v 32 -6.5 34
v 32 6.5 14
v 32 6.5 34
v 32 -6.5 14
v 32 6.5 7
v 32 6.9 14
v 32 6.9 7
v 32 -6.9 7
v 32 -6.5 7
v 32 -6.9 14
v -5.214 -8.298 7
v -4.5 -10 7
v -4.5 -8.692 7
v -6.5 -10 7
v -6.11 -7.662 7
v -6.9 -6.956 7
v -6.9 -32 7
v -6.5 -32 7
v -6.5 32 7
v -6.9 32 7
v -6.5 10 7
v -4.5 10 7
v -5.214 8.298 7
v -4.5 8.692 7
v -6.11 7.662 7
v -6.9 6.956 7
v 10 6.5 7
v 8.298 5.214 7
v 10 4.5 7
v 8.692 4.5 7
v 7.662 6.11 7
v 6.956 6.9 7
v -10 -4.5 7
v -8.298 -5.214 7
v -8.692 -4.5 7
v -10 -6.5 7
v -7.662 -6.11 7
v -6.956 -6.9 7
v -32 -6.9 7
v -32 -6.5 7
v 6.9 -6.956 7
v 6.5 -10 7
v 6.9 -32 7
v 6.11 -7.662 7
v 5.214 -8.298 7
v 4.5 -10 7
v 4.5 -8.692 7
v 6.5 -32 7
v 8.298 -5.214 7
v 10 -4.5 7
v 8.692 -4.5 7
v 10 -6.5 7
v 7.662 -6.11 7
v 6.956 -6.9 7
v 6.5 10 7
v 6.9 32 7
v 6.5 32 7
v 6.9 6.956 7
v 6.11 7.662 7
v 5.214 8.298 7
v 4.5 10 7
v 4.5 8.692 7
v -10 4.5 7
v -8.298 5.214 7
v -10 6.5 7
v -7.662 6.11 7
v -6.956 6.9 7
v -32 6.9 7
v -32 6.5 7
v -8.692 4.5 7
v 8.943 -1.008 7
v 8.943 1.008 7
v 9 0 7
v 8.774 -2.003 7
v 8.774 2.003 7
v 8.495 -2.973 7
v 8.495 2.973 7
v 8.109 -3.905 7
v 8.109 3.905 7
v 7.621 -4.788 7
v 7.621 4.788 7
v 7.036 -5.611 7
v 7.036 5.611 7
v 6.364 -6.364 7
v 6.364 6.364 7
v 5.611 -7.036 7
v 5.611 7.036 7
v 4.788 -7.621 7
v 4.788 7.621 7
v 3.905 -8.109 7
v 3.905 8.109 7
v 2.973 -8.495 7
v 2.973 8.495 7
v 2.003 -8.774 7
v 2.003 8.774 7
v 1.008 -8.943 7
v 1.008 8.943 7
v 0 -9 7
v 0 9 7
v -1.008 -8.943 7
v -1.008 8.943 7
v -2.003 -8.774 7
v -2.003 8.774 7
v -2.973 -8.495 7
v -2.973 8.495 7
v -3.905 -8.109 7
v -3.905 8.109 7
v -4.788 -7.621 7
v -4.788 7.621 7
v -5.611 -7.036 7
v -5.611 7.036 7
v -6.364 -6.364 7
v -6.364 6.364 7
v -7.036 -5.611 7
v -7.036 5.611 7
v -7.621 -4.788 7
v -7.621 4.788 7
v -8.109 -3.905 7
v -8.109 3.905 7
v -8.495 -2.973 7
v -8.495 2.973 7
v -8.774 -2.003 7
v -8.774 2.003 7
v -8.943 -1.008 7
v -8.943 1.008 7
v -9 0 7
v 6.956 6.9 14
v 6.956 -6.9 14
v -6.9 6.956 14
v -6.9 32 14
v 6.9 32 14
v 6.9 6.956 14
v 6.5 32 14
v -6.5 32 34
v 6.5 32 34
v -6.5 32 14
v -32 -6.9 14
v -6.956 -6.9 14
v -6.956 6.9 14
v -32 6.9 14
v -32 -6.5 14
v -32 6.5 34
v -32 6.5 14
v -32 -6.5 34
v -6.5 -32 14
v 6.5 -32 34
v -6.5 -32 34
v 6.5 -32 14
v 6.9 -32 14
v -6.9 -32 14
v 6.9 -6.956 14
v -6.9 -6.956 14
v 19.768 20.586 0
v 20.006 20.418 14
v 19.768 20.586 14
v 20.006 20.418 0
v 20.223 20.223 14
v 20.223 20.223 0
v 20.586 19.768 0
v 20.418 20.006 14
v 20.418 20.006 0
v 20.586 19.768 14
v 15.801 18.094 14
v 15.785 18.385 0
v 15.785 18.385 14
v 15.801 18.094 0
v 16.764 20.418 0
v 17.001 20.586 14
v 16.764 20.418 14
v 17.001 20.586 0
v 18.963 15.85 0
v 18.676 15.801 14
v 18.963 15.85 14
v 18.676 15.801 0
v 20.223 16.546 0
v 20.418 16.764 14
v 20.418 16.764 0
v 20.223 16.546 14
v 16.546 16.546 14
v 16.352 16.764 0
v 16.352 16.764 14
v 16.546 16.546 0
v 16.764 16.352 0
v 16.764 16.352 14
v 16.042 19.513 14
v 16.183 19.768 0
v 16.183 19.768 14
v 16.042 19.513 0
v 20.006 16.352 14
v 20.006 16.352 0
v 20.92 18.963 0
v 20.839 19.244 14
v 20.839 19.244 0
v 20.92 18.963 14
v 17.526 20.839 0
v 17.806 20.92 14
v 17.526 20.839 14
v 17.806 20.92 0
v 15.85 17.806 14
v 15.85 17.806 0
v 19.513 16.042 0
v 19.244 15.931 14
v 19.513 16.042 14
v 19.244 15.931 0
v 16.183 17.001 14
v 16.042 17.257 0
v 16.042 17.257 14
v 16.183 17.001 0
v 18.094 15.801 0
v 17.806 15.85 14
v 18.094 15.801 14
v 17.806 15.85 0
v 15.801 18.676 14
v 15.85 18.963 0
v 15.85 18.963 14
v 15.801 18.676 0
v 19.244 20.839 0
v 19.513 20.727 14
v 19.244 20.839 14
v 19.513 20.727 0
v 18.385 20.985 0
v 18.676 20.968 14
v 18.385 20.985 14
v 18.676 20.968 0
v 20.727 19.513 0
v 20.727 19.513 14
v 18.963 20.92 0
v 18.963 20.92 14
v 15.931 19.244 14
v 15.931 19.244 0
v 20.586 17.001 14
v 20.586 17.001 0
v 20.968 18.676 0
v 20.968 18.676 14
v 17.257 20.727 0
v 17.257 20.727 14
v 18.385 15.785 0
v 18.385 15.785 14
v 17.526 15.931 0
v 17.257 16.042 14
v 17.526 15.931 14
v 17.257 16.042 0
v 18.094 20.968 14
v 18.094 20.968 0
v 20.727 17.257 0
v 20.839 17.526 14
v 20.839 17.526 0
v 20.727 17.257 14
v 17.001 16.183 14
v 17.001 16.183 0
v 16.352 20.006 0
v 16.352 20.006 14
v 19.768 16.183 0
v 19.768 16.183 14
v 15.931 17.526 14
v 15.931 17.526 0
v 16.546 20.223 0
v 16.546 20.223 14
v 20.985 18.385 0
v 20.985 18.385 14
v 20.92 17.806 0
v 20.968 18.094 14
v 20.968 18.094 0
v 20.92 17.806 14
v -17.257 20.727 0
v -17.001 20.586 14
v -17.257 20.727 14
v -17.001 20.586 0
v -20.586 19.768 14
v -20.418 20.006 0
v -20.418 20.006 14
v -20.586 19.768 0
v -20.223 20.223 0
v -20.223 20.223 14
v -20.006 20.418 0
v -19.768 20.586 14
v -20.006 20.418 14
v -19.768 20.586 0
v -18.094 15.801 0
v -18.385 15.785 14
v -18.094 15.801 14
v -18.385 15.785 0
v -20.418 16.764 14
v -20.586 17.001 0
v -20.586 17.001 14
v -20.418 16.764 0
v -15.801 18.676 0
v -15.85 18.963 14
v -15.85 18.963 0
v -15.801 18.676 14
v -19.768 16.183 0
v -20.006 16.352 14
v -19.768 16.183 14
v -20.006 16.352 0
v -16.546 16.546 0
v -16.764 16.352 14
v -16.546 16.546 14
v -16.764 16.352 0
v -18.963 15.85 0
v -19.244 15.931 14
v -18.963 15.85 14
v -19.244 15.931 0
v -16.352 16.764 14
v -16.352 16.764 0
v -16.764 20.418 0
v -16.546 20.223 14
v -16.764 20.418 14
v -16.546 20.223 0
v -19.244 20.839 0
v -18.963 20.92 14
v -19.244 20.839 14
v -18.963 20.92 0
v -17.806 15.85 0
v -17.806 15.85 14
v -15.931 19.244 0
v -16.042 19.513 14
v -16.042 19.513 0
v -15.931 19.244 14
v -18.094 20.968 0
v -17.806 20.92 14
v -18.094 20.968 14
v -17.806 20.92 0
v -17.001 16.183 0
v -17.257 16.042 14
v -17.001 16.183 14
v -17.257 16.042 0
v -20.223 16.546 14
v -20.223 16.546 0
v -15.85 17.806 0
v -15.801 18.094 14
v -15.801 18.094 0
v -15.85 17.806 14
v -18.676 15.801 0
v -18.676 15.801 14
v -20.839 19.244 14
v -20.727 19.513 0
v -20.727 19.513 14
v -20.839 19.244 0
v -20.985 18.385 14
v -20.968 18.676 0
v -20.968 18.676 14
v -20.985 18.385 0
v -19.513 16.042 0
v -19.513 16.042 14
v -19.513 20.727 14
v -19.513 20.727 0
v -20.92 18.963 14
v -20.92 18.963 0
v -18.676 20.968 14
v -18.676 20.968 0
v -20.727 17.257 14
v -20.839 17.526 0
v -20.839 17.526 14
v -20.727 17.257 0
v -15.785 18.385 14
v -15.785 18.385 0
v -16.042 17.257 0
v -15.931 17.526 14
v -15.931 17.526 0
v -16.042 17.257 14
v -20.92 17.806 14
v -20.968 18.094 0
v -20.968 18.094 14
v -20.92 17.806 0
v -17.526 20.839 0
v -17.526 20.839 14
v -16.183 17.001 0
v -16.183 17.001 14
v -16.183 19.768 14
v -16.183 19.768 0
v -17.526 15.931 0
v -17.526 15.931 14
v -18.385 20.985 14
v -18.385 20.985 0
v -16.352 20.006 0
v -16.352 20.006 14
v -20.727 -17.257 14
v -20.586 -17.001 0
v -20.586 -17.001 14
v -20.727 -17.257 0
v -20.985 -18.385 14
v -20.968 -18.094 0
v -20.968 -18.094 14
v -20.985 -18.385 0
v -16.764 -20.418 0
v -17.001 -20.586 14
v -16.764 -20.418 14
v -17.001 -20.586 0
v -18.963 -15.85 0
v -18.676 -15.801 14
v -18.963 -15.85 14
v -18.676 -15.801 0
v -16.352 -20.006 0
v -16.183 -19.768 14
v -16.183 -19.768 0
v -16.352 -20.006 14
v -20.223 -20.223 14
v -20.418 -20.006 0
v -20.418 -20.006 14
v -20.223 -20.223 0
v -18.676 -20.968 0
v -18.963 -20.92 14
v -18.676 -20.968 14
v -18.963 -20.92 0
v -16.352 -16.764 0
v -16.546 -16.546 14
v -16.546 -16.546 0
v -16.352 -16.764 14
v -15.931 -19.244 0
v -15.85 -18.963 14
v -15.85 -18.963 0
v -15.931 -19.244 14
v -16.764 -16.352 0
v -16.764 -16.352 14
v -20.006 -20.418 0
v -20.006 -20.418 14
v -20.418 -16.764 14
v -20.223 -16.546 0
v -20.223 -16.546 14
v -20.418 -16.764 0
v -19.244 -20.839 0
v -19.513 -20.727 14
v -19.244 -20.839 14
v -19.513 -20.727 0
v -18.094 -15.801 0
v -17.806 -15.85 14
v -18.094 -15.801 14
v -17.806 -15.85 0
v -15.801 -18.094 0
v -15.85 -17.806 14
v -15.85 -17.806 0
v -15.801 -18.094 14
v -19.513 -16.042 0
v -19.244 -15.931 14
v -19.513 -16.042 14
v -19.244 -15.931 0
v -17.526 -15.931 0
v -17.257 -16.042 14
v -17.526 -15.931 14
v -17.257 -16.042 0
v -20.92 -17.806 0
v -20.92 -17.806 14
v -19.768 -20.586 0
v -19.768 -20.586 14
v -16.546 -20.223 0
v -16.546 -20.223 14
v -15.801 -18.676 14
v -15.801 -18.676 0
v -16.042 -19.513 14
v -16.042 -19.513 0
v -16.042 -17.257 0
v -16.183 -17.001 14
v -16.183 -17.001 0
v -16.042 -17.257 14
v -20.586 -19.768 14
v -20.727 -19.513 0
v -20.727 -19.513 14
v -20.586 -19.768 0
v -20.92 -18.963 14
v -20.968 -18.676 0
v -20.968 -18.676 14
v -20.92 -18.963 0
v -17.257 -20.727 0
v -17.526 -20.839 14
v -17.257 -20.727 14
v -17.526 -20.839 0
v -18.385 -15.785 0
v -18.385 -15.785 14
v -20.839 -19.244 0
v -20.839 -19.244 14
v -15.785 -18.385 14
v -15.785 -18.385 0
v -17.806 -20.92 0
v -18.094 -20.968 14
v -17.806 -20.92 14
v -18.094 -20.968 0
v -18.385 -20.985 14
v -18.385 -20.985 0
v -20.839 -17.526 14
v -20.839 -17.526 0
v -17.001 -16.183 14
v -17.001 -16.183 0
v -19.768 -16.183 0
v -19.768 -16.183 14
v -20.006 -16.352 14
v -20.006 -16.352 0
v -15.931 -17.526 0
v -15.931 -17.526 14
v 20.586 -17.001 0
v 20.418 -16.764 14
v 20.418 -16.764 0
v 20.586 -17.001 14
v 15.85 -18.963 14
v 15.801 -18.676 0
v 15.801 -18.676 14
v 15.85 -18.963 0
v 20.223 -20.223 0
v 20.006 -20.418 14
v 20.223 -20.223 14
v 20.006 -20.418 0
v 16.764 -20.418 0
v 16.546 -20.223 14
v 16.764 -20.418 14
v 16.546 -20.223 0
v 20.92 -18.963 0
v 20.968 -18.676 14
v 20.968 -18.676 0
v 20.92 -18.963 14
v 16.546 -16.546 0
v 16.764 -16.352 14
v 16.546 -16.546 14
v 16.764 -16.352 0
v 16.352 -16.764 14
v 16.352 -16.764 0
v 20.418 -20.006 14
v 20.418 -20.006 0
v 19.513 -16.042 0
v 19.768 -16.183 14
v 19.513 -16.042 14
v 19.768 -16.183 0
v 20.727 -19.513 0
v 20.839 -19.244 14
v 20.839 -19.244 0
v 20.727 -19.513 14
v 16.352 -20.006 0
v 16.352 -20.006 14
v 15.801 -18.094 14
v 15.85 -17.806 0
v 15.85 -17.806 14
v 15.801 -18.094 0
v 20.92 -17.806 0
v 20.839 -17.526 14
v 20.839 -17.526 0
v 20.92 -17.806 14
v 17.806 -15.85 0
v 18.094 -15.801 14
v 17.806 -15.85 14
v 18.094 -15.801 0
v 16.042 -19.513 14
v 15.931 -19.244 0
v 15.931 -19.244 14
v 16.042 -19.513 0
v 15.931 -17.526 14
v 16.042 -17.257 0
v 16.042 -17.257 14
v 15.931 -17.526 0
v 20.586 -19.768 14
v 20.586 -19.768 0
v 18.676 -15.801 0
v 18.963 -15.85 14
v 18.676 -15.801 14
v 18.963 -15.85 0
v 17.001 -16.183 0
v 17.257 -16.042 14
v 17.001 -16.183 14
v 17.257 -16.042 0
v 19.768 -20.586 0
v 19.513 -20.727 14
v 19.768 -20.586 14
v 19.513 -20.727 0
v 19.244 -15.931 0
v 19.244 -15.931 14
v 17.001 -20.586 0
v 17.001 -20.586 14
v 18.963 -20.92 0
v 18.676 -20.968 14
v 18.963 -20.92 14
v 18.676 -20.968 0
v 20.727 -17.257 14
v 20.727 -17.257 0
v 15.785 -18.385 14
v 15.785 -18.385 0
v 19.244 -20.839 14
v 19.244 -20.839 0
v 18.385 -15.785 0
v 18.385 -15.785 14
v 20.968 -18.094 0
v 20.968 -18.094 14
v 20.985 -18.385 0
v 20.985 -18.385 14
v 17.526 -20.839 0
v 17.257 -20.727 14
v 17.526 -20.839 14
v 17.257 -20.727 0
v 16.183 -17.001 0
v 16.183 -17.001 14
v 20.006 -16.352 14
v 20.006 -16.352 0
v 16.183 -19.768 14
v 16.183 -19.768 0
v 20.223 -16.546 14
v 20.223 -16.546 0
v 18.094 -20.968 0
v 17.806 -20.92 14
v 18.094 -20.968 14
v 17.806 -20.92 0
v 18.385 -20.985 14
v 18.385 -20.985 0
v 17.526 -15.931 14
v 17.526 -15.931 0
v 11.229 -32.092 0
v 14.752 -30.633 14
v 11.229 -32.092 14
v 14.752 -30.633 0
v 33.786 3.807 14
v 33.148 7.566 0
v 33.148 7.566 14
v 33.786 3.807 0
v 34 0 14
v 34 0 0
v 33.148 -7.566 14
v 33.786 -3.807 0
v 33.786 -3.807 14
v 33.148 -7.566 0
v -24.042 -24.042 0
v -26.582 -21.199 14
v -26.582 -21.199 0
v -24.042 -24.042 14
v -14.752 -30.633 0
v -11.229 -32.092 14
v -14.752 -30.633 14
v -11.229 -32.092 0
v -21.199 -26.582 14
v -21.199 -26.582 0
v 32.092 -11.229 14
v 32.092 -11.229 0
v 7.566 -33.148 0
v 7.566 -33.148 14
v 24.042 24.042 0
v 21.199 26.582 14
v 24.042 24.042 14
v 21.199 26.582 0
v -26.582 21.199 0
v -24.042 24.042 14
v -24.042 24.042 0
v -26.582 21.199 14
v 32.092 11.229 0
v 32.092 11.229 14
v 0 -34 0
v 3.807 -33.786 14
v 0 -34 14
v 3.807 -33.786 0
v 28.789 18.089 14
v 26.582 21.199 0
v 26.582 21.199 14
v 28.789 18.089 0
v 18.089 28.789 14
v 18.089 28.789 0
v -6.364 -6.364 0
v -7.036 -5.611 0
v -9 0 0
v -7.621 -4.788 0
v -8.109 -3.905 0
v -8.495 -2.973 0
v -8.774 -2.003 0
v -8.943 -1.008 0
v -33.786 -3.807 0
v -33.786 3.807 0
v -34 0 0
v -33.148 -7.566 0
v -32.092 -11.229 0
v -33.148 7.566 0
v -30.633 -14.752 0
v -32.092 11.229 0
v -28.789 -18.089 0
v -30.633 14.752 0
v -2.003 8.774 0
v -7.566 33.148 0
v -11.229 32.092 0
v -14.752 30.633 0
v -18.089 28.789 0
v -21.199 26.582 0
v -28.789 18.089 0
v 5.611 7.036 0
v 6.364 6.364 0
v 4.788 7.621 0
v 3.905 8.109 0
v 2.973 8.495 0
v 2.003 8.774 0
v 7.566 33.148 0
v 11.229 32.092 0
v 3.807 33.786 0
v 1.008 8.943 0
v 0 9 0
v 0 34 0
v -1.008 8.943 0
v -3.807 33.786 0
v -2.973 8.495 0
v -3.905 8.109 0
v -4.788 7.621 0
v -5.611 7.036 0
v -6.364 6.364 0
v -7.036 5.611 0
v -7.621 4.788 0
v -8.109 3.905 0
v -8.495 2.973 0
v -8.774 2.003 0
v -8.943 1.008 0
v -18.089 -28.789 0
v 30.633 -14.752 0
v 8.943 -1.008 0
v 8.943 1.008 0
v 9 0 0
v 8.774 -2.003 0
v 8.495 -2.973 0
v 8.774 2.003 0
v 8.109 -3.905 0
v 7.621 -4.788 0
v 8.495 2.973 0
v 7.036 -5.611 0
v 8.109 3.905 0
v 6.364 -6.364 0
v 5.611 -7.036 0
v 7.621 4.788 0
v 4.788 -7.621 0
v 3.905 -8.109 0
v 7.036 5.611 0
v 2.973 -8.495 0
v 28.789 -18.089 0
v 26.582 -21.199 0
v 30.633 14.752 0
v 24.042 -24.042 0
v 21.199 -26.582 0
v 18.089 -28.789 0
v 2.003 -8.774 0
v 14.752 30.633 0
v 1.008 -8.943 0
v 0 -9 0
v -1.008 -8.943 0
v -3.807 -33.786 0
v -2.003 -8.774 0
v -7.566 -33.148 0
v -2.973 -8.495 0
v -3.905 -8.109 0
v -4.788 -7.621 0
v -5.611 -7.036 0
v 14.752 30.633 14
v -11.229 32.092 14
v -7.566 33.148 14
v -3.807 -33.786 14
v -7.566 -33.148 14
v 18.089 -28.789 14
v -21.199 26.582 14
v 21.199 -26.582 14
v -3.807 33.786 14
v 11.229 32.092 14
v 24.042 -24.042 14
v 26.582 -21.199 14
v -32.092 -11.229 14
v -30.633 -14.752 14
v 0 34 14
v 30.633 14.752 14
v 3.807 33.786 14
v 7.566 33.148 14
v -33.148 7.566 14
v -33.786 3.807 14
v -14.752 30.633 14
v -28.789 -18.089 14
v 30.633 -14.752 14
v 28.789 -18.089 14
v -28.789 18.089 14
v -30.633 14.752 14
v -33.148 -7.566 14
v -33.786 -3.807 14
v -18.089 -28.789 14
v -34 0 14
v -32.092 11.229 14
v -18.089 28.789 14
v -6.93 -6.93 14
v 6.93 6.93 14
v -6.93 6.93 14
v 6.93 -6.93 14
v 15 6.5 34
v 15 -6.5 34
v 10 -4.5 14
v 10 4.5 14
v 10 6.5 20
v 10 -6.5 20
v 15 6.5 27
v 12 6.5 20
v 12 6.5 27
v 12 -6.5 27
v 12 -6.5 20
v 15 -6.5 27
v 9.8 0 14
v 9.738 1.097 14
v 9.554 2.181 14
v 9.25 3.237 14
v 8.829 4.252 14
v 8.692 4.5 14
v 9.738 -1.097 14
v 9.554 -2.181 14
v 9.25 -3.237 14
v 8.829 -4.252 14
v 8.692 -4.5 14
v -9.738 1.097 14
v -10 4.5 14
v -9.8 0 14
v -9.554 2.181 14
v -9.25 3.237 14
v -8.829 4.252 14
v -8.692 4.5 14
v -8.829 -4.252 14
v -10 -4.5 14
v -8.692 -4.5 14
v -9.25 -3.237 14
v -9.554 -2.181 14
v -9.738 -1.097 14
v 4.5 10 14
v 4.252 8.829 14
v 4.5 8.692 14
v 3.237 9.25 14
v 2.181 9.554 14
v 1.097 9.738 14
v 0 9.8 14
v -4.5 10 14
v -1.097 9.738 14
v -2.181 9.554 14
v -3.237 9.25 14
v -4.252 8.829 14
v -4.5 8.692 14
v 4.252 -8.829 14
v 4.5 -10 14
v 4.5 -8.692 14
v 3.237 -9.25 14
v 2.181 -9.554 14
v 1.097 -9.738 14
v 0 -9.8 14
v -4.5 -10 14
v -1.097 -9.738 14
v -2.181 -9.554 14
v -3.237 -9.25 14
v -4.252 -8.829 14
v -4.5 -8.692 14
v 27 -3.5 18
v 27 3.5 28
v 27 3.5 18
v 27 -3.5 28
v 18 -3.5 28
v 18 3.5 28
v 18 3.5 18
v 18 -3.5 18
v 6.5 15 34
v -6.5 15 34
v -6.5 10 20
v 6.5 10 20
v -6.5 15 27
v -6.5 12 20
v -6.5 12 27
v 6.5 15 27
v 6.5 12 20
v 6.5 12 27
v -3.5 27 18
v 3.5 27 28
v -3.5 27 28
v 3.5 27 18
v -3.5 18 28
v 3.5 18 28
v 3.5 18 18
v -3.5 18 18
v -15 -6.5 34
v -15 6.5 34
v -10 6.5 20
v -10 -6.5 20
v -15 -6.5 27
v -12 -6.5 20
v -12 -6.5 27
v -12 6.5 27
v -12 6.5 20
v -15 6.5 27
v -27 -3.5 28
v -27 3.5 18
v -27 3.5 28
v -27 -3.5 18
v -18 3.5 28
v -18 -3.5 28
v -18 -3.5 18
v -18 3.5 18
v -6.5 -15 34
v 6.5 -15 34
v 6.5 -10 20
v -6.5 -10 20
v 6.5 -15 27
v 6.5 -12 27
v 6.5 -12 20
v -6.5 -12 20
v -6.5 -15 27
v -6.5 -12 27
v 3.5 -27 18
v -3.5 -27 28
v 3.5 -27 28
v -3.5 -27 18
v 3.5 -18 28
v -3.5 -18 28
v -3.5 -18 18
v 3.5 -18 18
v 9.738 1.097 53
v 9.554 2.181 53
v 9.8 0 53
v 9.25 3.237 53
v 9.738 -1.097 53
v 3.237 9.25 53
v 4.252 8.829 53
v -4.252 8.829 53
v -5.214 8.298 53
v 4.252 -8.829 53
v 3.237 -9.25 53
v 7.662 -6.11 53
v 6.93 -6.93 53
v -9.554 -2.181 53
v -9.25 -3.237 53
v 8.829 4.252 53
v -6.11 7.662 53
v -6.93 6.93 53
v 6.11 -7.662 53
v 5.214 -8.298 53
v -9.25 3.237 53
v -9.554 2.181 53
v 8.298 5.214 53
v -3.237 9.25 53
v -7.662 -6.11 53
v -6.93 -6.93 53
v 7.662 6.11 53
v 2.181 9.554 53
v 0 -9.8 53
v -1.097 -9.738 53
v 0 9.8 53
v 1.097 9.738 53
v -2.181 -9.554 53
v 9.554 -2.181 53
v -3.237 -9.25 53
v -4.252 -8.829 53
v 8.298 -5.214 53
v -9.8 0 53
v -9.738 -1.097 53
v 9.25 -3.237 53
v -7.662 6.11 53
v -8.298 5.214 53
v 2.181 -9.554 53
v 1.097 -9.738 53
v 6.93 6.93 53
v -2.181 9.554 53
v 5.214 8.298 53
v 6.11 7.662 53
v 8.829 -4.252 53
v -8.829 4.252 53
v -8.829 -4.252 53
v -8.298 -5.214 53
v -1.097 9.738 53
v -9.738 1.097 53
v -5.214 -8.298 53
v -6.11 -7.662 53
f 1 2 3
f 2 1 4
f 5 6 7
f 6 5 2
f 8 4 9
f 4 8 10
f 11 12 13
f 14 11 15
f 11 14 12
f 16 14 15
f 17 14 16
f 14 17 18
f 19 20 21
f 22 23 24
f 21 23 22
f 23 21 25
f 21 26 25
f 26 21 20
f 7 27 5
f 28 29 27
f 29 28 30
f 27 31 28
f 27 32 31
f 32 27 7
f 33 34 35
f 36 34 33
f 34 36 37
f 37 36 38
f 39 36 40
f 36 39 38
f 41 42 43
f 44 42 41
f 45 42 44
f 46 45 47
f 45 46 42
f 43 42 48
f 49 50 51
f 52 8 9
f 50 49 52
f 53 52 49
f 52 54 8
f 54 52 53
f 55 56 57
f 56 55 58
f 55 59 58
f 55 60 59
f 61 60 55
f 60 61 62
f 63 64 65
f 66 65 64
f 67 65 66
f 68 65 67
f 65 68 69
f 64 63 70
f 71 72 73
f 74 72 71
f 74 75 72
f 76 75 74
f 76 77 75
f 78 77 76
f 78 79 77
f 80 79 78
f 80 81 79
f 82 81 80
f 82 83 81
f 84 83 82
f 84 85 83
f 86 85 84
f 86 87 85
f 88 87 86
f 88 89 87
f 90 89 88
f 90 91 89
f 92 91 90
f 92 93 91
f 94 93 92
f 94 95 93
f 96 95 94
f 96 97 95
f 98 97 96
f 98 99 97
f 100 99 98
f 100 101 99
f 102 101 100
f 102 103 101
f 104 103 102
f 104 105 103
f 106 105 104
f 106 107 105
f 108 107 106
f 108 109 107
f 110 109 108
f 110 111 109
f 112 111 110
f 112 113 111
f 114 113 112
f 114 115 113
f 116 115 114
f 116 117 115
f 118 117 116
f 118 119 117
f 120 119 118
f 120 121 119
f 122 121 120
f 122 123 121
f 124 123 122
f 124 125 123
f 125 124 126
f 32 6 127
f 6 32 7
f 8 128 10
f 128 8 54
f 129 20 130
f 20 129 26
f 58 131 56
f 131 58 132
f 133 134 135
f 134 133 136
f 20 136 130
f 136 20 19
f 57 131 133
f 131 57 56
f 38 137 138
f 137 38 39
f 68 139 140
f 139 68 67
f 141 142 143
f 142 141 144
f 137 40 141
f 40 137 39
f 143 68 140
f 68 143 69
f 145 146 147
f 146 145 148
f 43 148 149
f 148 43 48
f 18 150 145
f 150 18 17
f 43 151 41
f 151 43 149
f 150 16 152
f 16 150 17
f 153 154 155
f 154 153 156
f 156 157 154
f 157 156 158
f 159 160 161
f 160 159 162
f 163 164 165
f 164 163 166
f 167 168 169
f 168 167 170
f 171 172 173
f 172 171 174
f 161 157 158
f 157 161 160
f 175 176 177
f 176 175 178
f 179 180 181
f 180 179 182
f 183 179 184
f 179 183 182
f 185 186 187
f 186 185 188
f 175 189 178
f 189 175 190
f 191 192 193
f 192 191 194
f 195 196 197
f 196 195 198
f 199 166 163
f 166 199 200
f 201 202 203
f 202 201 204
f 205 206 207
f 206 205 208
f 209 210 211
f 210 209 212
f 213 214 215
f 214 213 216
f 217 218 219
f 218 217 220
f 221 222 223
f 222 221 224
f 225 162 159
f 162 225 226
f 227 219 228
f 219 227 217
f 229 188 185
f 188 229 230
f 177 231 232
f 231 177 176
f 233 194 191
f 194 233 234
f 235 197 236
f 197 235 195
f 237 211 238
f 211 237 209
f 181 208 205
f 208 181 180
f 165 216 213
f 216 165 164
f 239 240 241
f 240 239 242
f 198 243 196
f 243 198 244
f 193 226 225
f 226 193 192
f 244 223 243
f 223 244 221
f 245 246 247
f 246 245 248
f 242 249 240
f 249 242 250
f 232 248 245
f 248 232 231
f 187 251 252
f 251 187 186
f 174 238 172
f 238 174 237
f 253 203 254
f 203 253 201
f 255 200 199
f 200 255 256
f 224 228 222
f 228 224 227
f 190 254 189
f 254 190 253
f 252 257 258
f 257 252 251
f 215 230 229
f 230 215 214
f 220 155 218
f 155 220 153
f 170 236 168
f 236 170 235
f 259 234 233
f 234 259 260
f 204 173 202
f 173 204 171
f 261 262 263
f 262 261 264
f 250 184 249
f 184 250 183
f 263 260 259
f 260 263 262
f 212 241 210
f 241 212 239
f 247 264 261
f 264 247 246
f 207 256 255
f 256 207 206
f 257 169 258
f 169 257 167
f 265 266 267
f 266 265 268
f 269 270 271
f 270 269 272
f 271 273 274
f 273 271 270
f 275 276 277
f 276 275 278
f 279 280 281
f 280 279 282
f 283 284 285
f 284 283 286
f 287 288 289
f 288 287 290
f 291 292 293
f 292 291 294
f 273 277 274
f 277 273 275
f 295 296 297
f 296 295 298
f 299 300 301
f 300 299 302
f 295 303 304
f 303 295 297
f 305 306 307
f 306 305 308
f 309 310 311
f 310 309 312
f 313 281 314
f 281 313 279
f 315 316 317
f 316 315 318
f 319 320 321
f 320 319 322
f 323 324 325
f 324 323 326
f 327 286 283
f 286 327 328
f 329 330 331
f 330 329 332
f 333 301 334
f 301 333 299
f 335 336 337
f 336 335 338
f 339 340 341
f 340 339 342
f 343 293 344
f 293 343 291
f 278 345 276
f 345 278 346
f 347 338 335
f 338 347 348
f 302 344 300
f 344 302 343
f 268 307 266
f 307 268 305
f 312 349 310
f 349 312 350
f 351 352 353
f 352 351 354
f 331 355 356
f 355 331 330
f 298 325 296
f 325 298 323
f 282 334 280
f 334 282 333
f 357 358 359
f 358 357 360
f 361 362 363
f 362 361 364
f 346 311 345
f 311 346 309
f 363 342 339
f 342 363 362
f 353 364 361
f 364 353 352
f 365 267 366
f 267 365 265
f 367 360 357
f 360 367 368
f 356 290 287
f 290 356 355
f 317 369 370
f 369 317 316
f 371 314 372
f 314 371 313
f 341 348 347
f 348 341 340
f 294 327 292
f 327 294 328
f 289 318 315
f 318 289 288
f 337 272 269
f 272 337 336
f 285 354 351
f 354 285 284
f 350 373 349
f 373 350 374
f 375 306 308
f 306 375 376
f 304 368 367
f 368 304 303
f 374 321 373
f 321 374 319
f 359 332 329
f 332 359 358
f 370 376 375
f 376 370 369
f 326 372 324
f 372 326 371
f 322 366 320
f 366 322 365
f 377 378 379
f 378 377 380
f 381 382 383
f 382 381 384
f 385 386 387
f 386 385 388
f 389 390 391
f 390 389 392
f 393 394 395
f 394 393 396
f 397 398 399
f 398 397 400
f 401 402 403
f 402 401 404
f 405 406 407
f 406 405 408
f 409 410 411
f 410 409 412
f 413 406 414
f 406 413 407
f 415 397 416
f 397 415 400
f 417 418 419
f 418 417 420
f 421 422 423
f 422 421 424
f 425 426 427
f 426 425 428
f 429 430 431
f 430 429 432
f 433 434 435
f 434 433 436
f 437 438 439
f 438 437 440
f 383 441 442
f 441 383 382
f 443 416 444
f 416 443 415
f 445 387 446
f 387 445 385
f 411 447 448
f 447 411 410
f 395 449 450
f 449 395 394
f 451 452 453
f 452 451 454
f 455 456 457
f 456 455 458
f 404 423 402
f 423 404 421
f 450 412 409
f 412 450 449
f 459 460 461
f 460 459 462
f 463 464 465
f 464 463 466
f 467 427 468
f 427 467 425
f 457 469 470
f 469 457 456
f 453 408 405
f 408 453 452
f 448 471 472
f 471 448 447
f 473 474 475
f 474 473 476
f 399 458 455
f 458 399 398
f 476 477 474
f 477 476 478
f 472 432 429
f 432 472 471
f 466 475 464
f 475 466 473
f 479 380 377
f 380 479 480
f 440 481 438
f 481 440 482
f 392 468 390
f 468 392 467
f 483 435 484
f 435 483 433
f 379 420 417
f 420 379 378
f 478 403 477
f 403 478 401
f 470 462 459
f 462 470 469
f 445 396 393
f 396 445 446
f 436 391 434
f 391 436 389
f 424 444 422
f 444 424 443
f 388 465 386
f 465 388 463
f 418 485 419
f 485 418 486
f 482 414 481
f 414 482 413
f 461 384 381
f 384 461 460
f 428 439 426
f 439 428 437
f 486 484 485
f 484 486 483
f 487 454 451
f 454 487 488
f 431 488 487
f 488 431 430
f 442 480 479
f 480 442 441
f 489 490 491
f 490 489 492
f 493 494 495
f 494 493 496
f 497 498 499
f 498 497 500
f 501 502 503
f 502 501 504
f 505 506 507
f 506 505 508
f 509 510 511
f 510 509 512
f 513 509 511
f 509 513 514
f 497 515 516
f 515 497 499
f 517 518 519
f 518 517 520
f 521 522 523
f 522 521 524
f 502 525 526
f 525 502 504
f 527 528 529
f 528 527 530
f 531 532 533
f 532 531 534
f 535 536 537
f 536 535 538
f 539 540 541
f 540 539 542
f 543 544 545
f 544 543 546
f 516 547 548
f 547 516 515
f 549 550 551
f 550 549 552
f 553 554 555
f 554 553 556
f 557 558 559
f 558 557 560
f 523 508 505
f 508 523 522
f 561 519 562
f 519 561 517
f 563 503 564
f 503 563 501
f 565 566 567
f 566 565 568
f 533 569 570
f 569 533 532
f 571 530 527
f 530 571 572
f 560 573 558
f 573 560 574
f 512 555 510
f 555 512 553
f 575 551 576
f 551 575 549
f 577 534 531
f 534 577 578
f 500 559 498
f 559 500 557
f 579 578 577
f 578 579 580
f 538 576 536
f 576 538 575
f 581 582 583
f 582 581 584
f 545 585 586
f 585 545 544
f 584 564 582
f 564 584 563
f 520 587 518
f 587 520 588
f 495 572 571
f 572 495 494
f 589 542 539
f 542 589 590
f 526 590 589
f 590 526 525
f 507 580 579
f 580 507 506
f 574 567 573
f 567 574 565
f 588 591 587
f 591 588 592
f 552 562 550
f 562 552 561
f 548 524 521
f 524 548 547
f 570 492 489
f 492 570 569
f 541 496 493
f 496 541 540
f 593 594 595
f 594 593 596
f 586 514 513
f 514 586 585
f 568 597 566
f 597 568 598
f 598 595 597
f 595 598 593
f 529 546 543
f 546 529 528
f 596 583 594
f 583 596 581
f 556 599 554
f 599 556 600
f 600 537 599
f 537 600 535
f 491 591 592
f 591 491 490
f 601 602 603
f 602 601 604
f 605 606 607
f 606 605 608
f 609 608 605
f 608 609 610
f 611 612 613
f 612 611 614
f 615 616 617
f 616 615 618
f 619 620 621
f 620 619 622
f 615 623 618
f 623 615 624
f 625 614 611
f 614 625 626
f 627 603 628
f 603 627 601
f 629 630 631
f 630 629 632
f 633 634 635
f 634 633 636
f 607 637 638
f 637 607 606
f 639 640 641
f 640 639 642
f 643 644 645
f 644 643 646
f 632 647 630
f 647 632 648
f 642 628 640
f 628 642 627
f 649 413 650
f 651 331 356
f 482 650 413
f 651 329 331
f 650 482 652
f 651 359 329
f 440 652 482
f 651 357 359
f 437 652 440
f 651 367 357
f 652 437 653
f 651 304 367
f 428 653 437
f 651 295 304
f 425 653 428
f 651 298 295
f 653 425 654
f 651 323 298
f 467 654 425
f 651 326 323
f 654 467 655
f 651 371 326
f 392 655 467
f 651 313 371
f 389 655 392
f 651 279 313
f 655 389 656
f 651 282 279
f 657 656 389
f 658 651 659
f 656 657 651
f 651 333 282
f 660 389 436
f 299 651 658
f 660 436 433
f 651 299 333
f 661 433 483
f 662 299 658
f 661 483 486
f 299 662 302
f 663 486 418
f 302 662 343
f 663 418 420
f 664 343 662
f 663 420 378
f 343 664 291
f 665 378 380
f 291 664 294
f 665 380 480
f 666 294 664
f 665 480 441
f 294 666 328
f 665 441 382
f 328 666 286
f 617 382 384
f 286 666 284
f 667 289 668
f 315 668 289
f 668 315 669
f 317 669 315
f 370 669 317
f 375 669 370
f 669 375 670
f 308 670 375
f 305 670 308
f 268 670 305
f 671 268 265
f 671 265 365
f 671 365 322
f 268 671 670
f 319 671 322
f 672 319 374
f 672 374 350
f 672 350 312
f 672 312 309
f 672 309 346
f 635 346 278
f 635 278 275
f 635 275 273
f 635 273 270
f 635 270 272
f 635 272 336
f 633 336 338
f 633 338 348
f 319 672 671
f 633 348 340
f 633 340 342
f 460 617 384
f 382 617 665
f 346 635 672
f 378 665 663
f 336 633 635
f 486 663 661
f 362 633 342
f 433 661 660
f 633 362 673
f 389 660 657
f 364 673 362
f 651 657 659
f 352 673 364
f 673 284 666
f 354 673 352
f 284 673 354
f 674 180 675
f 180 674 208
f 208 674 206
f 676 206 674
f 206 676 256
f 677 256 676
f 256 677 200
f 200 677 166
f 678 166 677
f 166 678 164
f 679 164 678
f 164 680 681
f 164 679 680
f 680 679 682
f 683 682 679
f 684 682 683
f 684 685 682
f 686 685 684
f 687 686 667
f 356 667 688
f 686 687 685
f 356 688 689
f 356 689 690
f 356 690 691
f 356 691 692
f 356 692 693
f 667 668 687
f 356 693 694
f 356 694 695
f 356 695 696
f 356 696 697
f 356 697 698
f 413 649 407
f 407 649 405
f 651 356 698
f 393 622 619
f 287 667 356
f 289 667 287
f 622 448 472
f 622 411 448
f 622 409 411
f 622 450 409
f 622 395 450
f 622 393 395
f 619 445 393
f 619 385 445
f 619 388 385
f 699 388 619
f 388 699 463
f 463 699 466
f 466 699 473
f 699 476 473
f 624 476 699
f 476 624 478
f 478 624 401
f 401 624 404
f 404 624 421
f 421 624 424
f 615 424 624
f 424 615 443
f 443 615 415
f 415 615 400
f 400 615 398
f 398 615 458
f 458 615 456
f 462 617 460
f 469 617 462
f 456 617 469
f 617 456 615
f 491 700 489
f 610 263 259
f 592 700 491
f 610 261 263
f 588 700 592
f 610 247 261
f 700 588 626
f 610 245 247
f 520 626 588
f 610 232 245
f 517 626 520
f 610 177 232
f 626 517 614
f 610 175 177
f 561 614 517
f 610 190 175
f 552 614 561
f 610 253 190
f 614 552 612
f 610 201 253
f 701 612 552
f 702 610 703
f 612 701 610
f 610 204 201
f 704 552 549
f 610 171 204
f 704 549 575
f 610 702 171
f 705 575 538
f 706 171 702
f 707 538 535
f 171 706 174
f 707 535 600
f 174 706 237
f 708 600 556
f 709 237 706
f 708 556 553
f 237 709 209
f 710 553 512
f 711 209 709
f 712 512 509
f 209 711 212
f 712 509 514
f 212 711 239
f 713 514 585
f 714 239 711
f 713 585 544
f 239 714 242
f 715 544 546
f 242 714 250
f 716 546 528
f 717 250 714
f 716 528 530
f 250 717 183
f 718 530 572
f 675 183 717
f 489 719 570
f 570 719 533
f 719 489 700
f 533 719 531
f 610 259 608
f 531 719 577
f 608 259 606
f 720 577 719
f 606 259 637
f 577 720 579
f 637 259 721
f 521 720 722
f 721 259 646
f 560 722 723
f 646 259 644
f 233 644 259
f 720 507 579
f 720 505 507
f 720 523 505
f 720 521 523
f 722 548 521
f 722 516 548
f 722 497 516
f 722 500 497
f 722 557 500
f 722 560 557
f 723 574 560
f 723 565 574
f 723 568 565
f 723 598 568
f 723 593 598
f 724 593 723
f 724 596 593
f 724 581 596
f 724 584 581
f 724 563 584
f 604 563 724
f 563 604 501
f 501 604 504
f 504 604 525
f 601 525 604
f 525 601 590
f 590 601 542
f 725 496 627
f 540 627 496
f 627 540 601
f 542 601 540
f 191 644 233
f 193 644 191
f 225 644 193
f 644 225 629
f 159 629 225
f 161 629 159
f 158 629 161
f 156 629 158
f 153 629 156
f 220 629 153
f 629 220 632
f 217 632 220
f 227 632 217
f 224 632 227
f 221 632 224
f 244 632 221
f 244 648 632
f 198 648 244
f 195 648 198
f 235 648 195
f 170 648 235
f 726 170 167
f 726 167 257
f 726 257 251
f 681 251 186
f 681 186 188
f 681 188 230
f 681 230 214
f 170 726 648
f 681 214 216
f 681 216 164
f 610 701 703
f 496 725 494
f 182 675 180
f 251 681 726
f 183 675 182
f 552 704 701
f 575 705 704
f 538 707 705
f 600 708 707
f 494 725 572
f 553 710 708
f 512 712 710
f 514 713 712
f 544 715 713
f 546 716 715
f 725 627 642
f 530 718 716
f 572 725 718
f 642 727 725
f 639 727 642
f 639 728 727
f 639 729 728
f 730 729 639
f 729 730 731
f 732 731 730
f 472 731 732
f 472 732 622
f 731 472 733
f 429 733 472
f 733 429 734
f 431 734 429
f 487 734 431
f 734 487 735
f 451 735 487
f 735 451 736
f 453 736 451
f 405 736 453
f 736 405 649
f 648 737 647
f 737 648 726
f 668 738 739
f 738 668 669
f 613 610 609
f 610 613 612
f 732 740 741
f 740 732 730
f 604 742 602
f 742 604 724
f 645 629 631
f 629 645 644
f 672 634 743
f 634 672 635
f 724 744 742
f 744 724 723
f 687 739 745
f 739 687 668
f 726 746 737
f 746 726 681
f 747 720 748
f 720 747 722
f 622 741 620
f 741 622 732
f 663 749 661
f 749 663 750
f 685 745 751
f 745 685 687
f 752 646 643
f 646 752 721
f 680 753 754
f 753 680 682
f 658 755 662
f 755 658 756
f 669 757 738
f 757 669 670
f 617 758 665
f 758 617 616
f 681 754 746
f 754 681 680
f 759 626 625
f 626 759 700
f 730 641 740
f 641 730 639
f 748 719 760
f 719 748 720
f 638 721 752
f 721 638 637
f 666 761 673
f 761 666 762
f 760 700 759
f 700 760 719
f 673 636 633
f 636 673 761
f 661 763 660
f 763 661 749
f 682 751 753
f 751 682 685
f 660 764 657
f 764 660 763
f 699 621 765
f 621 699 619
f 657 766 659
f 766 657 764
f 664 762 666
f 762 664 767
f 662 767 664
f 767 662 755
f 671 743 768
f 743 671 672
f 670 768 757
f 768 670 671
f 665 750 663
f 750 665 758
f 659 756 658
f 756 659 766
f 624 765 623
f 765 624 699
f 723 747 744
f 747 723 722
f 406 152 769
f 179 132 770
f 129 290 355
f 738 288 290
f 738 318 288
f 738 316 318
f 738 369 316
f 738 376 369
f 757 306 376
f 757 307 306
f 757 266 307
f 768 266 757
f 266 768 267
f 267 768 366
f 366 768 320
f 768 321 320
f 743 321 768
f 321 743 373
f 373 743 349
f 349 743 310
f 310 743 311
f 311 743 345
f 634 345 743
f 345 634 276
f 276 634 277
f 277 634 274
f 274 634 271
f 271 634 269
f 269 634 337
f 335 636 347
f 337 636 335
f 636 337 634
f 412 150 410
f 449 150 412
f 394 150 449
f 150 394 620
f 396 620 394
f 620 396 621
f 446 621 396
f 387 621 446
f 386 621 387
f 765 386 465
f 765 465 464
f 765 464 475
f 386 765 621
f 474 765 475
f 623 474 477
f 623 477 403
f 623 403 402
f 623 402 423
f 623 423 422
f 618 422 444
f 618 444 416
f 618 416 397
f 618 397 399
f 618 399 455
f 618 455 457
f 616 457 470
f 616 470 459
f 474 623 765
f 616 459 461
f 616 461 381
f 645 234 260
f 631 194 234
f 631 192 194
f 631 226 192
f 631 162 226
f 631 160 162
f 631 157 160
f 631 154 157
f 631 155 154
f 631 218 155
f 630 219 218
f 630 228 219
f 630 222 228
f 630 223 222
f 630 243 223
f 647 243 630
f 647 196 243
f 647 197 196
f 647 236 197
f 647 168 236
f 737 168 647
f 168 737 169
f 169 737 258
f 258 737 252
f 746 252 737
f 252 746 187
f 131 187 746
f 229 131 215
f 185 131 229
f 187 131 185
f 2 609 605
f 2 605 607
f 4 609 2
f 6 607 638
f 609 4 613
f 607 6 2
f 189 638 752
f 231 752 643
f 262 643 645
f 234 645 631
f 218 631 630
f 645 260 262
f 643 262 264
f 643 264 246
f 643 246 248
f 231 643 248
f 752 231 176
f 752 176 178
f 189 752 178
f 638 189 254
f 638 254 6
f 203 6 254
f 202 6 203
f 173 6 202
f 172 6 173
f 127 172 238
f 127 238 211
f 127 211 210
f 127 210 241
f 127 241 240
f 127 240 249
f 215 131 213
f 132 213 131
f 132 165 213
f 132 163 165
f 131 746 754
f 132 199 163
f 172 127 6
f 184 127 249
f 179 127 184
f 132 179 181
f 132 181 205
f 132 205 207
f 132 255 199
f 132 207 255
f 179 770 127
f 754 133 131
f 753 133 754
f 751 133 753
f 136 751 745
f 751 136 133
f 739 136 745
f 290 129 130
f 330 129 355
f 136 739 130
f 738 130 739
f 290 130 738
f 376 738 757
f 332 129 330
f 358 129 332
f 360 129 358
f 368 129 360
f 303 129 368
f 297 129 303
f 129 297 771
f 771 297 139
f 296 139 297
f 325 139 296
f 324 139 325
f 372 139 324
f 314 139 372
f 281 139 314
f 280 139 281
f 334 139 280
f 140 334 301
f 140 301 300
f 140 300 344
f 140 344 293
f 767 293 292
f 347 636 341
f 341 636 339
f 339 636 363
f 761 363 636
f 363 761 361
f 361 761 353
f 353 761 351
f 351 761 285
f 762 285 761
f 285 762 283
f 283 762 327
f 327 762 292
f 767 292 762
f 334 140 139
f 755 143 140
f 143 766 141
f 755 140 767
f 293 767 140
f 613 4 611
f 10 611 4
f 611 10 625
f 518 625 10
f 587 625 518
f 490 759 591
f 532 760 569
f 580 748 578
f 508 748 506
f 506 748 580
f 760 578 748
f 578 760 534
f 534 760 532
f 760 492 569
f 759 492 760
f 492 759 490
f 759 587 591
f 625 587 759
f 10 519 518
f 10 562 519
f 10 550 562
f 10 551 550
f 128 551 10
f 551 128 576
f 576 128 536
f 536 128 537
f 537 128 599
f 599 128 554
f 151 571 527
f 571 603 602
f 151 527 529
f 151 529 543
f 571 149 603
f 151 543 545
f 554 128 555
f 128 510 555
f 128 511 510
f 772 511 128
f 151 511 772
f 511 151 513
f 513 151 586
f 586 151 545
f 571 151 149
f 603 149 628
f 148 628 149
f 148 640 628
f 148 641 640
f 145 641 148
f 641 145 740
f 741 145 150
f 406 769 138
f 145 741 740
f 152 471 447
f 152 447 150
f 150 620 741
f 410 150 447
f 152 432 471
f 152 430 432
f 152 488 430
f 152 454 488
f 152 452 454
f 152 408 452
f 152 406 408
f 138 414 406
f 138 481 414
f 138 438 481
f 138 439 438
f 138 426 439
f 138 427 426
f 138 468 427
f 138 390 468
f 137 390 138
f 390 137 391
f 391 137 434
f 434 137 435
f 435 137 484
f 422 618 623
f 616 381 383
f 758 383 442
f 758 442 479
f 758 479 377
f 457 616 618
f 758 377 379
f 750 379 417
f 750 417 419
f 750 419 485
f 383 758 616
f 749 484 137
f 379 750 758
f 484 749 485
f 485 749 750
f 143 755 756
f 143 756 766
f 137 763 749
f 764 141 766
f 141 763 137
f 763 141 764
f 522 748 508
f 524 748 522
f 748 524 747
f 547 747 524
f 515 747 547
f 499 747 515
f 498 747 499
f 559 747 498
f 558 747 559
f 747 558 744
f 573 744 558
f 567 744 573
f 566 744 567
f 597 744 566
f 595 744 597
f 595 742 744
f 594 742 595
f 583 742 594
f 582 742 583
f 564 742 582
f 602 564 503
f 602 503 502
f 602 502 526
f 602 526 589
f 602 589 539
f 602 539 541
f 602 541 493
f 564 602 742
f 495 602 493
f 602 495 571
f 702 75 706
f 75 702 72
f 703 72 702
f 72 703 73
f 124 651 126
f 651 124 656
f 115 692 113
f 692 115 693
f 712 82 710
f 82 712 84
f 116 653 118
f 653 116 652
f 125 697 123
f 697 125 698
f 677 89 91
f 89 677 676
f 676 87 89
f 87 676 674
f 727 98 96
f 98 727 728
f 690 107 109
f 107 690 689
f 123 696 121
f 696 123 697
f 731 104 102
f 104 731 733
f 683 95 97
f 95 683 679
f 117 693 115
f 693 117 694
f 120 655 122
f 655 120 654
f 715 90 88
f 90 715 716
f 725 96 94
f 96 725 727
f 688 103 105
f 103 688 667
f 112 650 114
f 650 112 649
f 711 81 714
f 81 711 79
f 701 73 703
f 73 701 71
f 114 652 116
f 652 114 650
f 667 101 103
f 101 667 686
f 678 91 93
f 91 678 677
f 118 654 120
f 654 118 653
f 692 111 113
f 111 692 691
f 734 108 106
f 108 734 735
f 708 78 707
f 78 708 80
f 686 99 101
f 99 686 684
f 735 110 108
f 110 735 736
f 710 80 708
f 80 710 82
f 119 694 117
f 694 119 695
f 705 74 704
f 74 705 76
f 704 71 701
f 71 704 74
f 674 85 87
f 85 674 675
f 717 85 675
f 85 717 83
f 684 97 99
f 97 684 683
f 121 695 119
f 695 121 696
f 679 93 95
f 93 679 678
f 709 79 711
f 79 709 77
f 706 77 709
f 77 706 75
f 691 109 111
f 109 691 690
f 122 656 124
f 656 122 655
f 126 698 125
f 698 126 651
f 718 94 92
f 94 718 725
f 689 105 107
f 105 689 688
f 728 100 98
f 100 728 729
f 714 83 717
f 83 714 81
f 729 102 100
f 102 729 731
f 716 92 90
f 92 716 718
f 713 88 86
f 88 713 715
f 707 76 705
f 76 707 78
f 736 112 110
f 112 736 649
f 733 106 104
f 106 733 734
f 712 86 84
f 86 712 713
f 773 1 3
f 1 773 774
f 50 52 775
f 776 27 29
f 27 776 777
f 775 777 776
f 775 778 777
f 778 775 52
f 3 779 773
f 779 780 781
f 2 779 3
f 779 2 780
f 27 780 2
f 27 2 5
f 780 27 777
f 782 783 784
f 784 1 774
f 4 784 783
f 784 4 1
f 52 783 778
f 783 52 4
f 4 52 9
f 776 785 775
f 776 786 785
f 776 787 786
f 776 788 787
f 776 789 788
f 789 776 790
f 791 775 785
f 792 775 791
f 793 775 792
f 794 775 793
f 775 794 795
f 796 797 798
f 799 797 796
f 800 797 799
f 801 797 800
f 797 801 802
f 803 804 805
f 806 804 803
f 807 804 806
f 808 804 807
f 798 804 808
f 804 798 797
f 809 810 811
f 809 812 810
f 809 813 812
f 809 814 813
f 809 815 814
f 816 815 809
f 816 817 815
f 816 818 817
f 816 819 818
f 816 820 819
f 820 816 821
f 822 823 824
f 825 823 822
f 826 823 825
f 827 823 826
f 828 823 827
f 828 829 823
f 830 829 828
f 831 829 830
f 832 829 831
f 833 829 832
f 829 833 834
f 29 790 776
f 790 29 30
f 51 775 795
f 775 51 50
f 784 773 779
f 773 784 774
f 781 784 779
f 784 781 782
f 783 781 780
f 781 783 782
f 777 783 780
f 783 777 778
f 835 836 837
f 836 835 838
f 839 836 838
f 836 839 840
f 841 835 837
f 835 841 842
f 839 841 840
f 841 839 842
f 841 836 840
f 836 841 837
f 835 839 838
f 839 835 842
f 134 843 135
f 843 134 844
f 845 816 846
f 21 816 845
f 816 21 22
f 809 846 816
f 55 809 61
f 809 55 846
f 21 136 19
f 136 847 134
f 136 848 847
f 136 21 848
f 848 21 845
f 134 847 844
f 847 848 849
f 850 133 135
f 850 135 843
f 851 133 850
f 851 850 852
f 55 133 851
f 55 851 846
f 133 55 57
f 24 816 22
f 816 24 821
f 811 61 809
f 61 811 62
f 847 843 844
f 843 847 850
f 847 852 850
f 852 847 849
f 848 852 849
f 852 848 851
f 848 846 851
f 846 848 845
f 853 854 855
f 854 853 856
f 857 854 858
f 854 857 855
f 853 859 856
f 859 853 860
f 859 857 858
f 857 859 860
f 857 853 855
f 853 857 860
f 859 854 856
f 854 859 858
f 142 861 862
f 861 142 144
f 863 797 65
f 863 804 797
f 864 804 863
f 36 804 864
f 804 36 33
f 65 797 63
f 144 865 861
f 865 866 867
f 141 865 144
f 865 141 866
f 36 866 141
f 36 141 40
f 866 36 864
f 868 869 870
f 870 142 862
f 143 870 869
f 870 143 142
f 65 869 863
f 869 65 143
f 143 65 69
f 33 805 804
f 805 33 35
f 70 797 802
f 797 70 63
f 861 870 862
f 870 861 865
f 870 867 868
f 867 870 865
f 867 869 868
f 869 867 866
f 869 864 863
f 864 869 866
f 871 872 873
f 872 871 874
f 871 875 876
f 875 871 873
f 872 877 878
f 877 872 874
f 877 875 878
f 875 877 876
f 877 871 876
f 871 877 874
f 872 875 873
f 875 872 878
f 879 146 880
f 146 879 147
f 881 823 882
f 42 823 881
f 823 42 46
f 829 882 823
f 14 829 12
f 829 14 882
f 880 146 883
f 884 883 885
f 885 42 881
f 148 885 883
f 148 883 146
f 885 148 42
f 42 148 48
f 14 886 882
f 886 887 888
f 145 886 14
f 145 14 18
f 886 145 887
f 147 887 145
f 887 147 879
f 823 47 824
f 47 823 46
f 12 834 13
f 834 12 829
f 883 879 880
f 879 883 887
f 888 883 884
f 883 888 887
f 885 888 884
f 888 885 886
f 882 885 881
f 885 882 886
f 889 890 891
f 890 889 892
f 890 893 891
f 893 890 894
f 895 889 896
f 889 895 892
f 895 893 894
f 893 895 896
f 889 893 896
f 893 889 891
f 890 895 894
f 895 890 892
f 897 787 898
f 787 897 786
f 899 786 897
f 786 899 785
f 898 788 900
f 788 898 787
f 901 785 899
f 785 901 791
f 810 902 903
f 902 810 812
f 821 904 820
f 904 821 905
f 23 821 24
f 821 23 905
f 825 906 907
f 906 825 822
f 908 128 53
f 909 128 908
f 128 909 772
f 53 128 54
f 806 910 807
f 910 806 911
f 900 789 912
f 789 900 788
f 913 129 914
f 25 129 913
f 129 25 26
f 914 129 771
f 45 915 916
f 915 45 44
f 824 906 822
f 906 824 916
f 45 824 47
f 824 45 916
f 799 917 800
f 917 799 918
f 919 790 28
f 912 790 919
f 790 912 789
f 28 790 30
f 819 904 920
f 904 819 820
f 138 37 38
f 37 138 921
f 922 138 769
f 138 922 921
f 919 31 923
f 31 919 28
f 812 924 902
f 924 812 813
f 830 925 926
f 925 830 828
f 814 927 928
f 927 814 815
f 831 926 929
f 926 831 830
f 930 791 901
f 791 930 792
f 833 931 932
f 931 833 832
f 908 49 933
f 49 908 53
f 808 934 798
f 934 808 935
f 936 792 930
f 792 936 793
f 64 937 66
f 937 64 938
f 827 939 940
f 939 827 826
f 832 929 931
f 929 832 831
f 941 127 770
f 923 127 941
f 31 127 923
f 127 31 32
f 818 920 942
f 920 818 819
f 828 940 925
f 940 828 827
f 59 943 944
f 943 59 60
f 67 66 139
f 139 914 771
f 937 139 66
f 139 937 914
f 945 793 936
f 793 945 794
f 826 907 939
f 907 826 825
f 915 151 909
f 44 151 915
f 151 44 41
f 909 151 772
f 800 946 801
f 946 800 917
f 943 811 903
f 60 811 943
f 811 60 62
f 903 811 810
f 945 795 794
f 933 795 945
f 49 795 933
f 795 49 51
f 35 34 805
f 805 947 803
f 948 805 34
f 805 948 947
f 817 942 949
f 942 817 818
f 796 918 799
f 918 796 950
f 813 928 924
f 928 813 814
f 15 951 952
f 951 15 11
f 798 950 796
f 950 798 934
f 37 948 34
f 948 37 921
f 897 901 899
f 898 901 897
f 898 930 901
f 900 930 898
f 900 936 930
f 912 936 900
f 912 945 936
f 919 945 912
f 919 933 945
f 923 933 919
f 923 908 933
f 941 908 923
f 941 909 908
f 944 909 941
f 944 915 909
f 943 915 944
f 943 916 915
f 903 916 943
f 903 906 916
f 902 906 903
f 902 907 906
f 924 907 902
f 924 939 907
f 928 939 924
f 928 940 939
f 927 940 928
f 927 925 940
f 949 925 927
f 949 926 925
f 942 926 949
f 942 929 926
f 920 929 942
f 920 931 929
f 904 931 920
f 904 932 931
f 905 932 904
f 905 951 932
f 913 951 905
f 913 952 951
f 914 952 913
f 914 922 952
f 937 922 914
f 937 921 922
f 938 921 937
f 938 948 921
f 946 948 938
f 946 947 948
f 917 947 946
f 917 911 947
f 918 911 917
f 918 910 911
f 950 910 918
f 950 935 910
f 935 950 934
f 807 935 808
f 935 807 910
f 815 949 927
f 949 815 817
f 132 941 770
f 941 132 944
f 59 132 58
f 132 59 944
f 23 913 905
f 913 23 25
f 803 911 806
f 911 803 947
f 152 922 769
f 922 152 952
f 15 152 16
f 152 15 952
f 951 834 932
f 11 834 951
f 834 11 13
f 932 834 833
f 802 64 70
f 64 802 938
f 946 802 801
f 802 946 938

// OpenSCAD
// A four-jaw chuck that opens and closes over one loop of $t — the kind of
// motion OpenSCAD's animation mode exists for, and what `scad_animate` renders.
//
// Open it in OpenSCAD and press Animate, or render it here:
//   cargo run --release --example scad_animate --features "openscad,video,native-codec"

$fn = 56;

// One out-and-back sweep per loop, eased so the ends do not snap.
stroke  = (1 - cos(360 * $t)) / 2;   // 0 → 1 → 0
opening = 10 + 10 * stroke;          // jaw face distance from the axis
spin    = 360 * $t;                  // the whole chuck turns once

body_r  = 34;    // outer radius
body_h  = 14;    // disc thickness
bore_r  = 9;
jaw_w   = 13;
jaw_h   = 20;
jaw_l   = 22;
slot_d  = 7;     // how deep the jaw channels are cut into the top face

// A jaw: a block on a tongue, with a stepped gripping face and a lightening
// pocket. It slides radially with `opening`.
module jaw() {
    color("gainsboro")
    translate([opening, 0, body_h - slot_d]) {
        difference() {
            union() {
                translate([0, -jaw_w / 2, 0]) cube([jaw_l, jaw_w, slot_d + jaw_h]);
                // Tongue that stays captive in the channel.
                translate([-8, -jaw_w / 2 + 2, 0]) cube([8, jaw_w - 4, slot_d]);
            }
            // Stepped gripping face.
            translate([-1, -jaw_w / 2 - 1, slot_d + jaw_h - 7]) cube([6, jaw_w + 2, 8]);
            translate([-1, -jaw_w / 2 - 1, slot_d + jaw_h - 14]) cube([3, jaw_w + 2, 8]);
            // Pocket.
            translate([jaw_l - 14, -jaw_w / 2 + 3, slot_d + 4])
                cube([9, jaw_w - 6, jaw_h - 10]);
        }
    }
}

// The body: a disc with a bore, four radial channels in its top face, and a
// bolt circle.
module body() {
    color("steelblue")
    difference() {
        cylinder(h = body_h, r = body_r);
        translate([0, 0, -1]) cylinder(h = body_h + 2, r = bore_r);
        for (a = [0 : 90 : 359])
            rotate([0, 0, a])
                translate([bore_r - 3, -jaw_w / 2 - 0.4, body_h - slot_d])
                    cube([body_r - bore_r + 1, jaw_w + 0.8, slot_d + 1]);
        for (a = [45 : 90 : 359])
            rotate([0, 0, a])
                translate([body_r - 8, 0, -1]) cylinder(h = body_h + 2, r = 2.6);
    }
}

// A held workpiece, present only while the jaws are closed on it.
module blank() {
    if (opening < 14)
        color([0.85, 0.45, 0.2, 0.85])
            translate([0, 0, body_h - slot_d]) cylinder(h = 46, r = opening - 0.2);
}

rotate([0, 0, spin]) {
    body();
    blank();
    for (a = [0 : 90 : 359]) rotate([0, 0, a]) jaw();
}
